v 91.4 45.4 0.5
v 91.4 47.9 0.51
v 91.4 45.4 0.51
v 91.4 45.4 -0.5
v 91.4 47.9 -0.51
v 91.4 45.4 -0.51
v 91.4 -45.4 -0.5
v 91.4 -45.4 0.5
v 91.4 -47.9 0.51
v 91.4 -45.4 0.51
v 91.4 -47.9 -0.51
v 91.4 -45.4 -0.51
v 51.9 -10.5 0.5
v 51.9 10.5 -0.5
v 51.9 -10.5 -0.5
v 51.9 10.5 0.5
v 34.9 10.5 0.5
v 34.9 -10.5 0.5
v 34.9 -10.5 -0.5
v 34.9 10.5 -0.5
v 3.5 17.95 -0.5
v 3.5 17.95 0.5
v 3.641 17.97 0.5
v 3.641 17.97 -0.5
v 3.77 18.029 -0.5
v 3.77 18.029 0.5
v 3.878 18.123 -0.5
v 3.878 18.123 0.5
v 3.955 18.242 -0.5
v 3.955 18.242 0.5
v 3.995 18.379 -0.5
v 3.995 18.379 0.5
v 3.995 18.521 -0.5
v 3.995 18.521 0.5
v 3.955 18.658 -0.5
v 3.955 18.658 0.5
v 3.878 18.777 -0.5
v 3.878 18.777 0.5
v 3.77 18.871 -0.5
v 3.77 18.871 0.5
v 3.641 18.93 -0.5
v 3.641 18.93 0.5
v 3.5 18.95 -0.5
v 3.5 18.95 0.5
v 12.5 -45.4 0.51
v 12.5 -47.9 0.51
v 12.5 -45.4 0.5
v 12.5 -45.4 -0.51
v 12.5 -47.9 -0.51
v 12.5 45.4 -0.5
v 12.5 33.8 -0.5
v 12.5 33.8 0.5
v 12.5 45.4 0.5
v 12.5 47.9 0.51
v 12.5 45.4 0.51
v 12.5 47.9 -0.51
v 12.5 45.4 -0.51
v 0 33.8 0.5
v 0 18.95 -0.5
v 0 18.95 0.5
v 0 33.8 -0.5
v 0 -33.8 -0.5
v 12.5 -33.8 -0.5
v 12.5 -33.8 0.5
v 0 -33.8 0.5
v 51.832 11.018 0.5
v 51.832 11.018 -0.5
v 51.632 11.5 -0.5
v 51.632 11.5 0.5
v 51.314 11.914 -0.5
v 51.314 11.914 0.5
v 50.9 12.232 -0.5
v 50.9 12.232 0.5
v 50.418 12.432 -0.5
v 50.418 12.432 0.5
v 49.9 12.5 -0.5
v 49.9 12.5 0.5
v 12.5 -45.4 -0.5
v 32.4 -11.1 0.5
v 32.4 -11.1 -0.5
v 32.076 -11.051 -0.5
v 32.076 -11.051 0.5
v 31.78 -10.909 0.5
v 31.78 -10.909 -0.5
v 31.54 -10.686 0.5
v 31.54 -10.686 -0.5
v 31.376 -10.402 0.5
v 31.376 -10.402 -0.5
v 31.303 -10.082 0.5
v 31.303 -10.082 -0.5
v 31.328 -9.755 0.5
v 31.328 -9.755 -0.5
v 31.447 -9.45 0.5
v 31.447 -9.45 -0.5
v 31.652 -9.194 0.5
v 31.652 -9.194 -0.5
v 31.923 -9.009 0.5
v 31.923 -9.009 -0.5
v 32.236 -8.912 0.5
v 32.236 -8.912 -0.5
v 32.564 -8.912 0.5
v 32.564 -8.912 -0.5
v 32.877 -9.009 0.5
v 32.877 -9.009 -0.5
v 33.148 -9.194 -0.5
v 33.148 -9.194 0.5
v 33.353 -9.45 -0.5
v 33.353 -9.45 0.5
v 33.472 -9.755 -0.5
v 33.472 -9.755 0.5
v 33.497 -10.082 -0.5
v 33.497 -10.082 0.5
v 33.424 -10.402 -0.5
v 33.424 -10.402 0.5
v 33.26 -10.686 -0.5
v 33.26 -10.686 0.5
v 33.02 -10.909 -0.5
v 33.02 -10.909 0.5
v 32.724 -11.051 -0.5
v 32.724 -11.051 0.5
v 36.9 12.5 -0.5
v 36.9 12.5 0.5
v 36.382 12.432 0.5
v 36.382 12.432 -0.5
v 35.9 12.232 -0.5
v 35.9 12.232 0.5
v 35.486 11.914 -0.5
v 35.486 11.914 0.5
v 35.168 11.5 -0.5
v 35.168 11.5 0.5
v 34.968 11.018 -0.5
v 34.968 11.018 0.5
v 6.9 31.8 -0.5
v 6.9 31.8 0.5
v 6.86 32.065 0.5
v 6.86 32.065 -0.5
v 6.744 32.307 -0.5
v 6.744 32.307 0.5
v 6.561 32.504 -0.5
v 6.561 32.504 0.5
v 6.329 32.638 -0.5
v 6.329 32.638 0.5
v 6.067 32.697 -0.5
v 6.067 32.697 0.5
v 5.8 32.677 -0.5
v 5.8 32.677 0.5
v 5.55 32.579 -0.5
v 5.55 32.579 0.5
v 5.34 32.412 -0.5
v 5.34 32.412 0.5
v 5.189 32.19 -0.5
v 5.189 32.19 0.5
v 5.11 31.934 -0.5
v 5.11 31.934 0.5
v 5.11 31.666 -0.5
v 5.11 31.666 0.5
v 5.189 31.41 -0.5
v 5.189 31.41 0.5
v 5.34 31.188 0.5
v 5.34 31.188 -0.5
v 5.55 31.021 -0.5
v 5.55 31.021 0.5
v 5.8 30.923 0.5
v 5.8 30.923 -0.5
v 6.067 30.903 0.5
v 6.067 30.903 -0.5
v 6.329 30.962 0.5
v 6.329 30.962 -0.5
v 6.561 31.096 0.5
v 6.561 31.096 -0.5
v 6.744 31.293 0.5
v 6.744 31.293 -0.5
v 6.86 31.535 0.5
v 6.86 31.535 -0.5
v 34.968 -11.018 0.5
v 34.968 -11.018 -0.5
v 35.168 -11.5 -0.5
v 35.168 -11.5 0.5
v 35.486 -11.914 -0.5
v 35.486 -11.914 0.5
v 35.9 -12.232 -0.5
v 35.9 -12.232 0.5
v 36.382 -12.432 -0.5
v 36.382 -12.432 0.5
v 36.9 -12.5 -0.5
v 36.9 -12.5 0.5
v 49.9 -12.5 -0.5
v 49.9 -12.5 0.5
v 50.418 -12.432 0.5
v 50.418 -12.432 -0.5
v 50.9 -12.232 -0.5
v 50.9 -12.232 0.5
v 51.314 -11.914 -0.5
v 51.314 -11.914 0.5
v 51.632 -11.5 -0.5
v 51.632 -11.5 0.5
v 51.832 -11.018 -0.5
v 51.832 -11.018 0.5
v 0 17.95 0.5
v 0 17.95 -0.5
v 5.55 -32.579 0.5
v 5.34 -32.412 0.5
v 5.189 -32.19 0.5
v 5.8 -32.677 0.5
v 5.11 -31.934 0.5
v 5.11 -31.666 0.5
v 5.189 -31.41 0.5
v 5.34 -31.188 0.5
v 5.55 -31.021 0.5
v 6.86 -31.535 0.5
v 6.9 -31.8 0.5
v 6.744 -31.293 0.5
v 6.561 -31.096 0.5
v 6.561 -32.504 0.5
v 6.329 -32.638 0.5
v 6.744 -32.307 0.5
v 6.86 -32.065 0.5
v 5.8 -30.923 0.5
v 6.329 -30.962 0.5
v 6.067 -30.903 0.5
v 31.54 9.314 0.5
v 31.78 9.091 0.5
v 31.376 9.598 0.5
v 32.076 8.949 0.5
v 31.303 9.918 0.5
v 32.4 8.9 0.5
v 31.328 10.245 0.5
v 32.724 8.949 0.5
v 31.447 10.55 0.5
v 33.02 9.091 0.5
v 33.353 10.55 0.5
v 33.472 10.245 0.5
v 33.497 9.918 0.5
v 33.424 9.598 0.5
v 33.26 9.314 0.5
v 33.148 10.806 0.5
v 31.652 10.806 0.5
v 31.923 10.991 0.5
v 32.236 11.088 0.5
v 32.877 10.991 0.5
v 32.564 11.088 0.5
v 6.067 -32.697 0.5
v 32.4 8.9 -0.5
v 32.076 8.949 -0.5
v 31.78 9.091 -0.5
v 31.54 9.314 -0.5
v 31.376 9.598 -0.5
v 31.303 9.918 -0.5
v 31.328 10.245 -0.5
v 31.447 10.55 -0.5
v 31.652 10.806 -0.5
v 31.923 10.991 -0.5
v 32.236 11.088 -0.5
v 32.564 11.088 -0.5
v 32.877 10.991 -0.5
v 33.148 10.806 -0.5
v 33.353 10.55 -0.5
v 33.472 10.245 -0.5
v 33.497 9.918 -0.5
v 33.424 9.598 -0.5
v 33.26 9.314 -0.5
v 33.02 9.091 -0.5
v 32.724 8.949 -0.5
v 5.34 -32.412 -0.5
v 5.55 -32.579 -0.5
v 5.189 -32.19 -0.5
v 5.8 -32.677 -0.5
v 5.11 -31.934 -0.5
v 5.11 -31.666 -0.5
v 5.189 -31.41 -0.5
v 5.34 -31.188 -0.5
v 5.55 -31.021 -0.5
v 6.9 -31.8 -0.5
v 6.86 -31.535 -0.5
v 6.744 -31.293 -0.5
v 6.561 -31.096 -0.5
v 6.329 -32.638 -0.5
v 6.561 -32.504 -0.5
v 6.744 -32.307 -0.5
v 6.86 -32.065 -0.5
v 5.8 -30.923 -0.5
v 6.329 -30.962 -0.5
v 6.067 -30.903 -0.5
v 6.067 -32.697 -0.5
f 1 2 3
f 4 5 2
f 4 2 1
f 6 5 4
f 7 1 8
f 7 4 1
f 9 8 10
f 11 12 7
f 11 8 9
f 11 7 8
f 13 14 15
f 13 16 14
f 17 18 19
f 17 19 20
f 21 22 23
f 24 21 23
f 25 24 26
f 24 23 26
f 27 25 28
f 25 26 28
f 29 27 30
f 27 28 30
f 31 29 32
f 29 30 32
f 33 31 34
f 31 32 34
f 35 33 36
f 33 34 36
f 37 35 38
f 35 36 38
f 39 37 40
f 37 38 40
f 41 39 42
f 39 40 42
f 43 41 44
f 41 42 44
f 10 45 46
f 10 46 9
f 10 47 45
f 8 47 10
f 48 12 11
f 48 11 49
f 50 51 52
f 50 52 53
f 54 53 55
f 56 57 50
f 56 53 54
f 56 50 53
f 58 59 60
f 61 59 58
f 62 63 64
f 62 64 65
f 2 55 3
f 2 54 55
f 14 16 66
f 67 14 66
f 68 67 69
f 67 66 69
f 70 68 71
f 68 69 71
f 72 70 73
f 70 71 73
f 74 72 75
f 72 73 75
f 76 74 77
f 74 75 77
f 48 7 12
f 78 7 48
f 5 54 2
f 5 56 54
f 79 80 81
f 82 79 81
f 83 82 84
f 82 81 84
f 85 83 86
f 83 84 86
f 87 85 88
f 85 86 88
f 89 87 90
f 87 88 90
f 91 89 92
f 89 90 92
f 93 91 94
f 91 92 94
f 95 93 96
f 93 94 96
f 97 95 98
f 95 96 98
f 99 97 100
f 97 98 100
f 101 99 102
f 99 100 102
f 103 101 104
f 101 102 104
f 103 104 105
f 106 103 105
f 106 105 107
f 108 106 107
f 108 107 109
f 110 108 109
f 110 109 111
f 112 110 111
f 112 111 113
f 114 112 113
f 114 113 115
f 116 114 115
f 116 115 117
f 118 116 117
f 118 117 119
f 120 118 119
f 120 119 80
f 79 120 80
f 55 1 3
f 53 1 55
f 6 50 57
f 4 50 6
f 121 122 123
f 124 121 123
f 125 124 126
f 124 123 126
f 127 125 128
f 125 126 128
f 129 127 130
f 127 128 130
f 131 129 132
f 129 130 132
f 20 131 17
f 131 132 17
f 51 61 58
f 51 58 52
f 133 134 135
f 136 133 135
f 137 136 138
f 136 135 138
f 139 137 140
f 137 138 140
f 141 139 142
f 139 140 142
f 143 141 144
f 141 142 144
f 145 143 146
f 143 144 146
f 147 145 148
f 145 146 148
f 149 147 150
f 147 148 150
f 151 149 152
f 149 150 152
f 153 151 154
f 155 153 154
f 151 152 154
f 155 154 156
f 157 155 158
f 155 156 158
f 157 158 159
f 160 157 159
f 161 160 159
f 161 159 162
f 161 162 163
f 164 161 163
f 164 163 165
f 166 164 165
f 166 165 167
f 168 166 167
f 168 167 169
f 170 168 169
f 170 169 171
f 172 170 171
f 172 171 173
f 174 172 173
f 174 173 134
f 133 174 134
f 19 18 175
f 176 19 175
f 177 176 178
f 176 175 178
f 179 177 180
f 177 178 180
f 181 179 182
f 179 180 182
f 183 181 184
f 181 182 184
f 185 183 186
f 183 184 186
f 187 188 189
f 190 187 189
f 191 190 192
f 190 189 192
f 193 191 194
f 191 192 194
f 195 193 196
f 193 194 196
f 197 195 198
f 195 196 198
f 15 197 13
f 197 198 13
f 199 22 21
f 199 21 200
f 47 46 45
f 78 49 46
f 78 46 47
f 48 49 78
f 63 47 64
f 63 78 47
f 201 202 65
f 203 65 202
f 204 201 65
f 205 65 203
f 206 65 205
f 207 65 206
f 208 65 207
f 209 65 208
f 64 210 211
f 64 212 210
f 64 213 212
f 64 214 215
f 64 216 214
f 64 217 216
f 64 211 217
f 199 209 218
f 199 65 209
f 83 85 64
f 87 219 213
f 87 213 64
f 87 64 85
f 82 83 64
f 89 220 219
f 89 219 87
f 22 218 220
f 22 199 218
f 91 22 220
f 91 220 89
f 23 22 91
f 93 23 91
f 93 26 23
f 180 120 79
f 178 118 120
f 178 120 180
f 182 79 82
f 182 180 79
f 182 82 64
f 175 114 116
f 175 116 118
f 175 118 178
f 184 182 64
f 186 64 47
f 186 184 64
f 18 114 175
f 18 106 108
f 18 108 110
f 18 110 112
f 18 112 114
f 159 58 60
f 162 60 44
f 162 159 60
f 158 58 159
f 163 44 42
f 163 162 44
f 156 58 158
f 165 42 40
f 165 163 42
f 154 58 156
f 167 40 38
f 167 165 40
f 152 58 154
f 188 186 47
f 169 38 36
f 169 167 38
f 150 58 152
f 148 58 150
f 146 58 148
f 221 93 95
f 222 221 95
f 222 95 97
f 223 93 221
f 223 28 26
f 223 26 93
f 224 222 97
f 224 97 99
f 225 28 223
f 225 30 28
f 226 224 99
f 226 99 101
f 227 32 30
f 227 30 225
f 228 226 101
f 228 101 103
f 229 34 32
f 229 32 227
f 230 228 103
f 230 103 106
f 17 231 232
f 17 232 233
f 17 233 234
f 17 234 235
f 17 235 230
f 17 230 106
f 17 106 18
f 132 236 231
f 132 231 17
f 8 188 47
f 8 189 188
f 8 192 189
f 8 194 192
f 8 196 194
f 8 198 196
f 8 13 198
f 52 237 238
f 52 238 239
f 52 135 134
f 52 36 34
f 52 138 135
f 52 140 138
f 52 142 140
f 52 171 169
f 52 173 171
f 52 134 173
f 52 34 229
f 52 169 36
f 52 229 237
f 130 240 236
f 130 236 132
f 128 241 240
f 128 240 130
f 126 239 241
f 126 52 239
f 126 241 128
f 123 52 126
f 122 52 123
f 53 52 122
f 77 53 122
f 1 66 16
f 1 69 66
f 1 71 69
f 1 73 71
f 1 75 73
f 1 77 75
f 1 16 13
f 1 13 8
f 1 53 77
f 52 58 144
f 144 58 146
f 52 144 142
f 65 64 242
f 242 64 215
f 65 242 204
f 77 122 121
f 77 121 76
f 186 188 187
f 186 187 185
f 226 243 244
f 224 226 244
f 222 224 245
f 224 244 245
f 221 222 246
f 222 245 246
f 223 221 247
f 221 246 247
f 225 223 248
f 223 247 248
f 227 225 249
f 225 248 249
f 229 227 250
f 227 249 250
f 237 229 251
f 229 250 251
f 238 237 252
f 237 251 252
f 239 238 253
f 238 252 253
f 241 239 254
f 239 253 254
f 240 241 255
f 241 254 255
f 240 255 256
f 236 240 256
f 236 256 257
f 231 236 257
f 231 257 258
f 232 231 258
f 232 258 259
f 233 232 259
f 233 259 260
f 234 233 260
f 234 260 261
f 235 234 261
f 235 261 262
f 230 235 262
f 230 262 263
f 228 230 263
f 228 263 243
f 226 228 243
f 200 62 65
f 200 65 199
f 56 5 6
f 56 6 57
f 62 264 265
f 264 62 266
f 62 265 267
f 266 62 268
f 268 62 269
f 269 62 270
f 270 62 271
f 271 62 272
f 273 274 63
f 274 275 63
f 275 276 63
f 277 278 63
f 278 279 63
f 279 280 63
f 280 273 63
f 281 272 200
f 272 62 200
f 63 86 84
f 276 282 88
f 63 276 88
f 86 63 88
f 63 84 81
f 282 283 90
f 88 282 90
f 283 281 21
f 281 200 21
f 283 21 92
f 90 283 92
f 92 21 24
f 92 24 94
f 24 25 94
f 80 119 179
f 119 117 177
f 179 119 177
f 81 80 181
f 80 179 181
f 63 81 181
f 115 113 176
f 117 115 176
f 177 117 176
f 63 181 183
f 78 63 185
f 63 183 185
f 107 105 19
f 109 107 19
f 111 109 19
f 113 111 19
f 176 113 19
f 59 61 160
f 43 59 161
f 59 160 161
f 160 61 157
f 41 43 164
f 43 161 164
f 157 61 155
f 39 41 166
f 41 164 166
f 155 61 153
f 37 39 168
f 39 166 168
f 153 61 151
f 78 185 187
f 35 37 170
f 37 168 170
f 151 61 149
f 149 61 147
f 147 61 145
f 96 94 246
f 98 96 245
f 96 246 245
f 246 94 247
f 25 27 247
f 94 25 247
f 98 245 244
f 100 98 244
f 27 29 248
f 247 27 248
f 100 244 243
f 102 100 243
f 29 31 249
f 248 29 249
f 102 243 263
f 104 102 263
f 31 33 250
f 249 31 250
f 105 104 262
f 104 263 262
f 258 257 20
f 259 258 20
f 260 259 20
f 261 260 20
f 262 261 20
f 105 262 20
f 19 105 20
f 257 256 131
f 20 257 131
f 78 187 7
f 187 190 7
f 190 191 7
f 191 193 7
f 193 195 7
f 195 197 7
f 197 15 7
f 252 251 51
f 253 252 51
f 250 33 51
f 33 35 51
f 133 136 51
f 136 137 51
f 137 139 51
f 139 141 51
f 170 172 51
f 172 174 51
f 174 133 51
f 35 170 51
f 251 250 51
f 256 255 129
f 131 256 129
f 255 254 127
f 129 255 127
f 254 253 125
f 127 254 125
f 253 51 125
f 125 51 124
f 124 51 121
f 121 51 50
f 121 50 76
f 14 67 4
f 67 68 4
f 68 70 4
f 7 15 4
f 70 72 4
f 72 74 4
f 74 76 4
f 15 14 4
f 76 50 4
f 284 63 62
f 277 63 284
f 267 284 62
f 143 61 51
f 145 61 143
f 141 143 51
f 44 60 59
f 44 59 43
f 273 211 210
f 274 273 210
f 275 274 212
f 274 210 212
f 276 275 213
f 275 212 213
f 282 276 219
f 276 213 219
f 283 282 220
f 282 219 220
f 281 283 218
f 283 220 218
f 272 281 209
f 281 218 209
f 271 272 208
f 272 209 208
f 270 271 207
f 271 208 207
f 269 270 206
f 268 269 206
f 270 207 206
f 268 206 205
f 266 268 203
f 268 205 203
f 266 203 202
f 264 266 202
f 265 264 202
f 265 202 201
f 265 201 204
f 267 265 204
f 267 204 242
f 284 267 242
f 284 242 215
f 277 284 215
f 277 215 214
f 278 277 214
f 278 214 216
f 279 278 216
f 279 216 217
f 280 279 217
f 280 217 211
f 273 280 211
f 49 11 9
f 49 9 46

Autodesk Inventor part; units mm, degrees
ref_plane "YZ Plane" through (0, 0, 0) normal (1, 0, 0) x (0, 1, 0)
ref_plane "XZ Plane" through (0, 0, 0) normal (0, 1, 0) x (-1, 0, 0)
ref_plane "XY Plane" through (0, 0, 0) normal (0, 0, 1) x (1, 0, 0)
sketch "Sketch1" plane through (0, 0, 0) normal (0, 0, 1) x (1, 0, 0)
  line L0 (0, 33.8) -> (12.5, 33.8)
  line L1 (12.5, 33.8) -> (12.5, 47.9)
  line L2 (12.5, 47.9) -> (91.4, 47.9)
  line L3 (91.4, 47.9) -> (91.4, -47.9)
  line L4 (91.4, -47.9) -> (12.5, -47.9)
  line L5 (12.5, -47.9) -> (12.5, -33.8)
  line L6 (12.5, -33.8) -> (0, -33.8)
  line L7 (0, -33.8) -> (0, 33.8)
  line L8 (-4.5, 48) -> (91.5, 48) construction
  line L9 (91.5, 48) -> (91.5, -48) construction
  line L10 (91.5, -48) -> (-4.5, -48) construction
  line L11 (-4.5, -48) -> (-4.5, 48) construction
  line L12 (-4.4, 47.9) -> (-3.4, 47.9) construction
  line L13 (-3.4, 47.9) -> (-3.4, -47.9) construction
  line L14 (-3.4, -47.9) -> (-4.4, -47.9) construction
  line L15 (-4.4, -47.9) -> (-4.4, 47.9) construction
  point P0 (0, 0)
  point P1 (0, 0)
  point P2 (-4.5, 0)
  dimension "d0" = 67.6
  dimension "d1" = 95.8
  dimension "d2" = 91.4
  dimension "d3" = 12.5
  dimension "d20" = 96
  dimension "d21" = 96
  dimension "d22" = 0.1
  dimension "d23" = 0.1
  dimension "d24" = 1
  dimension "d25" = 0.1
  dimension "d26" = 3.4
extrude "Extrusion1" add sketch "Sketch1" along normal mid plane 1
sketch "Sketch2" plane through (0, 0, 0.5) normal (0, 0, 1) x (1, 0, 0)
  line L0 (12.5, 33.8) -> (0, 33.8) projected
  line L1 (0, 33.8) -> (0, -33.8) projected
  line L2 (0, -33.8) -> (12.5, -33.8) projected
  line L3 (12.5, -33.8) -> (12.5, -47.9) projected
  line L4 (12.5, -47.9) -> (91.4, -47.9) projected
  line L5 (91.4, -47.9) -> (91.4, 47.9) projected
  line L6 (91.4, 47.9) -> (12.5, 47.9) projected
  line L7 (12.5, 47.9) -> (12.5, 33.8) projected
  line L8 (91.4, -47.9) -> (91.4, 47.9) projected
  line L9 (12.5, 47.9) -> (91.4, 47.9)
  line L10 (91.4, 47.9) -> (91.4, 45.4)
  line L11 (91.4, 45.4) -> (12.5, 45.4)
  line L12 (12.5, 45.4) -> (12.5, 47.9)
  line L13 (91.4, -47.9) -> (12.5, -47.9)
  line L14 (12.5, -47.9) -> (12.5, -45.4)
  line L15 (12.5, -45.4) -> (91.4, -45.4)
  line L16 (91.4, -45.4) -> (91.4, -47.9)
  point P0 (0, 0)
  dimension "d6" = 2.5
  dimension "d27" = 90.8
extrude "Extrusion2" add sketch "Sketch2" along normal blind 0.01 contours L7 L6 L5 L11 | L5 L4 L3 L15
mirror "Mirror1" about plane through (0, 0, 0) normal (0, 0, 1) of "Extrusion2"
sketch "Sketch3" plane through (0, 0, 0.5) normal (0, 0, 1) x (1, 0, 0)
  circle A0 centre (6, 31.8) radius 0.9
  circle A1 centre (6, -31.8) radius 0.9
  point P0 (0, 0)
  dimension "d9" = 1.8
  dimension "d10" = 6
  dimension "d11" = 31.8
  dimension "d12" = 31.8
extrude "Extrusion3" cut sketch "Sketch3" against normal through all
sketch "Sketch4" plane through (0, 0, 0.5) normal (0, 0, 1) x (1, 0, 0)
  circle A0 centre (6, 31.8) radius 0.9 projected
  circle A1 centre (6, -31.8) radius 0.9 projected
  line L0 (12.5, -45.4) -> (91.4, -45.4) projected
  line L1 (91.4, -45.4) -> (91.4, 45.4) projected
  line L2 (91.4, 45.4) -> (12.5, 45.4) projected
  line L3 (12.5, 45.4) -> (12.5, 33.8) projected
  line L4 (12.5, 33.8) -> (0, 33.8) projected
  line L5 (0, 33.8) -> (0, -33.8) projected
  line L6 (0, -33.8) -> (12.5, -33.8) projected
  line L7 (12.5, -33.8) -> (12.5, -45.4) projected
  line L8 (0, 18.95) -> (3.5, 18.95)
  arc A2 (3.5, 17.95) -> (3.5, 18.95) centre (3.5, 18.45) ccw
  line L9 (3.5, 17.95) -> (0, 17.95)
  point P0 (0, 0)
  dimension "d15" = 17.95
  dimension "d16" = 3.5
  dimension "d17" = 1
extrude "Extrusion4" cut sketch "Sketch4" against normal through all contours L5 L8 A2 L9
sketch "Sketch5" plane through (0, 0, 0.5) normal (0, 0, 1) x (1, 0, 0)
  line L0 (0, 18.95) -> (3.5, 18.95) projected
  arc A0 (3.5, 17.95) -> (3.5, 18.95) centre (3.5, 18.45) ccw projected
  line L1 (3.5, 17.95) -> (0, 17.95) projected
  line L2 (0, 17.95) -> (0, -33.8) projected
  line L3 (0, -33.8) -> (12.5, -33.8) projected
  line L4 (12.5, -33.8) -> (12.5, -45.4) projected
  line L5 (12.5, -45.4) -> (91.4, -45.4) projected
  line L6 (91.4, -45.4) -> (91.4, 45.4) projected
  line L7 (91.4, 45.4) -> (12.5, 45.4) projected
  line L8 (12.5, 45.4) -> (12.5, 33.8) projected
  line L9 (12.5, 33.8) -> (0, 33.8) projected
  line L10 (0, 33.8) -> (0, 18.95) projected
  circle A1 centre (6, -31.8) radius 0.9 projected
  circle A2 centre (6, 31.8) radius 0.9 projected
  circle A3 centre (43.4, 0) radius 6 construction
  line L11 (36.9, 12.5) -> (49.9, 12.5)
  line L12 (51.9, 10.5) -> (51.9, -10.5)
  line L13 (49.9, -12.5) -> (36.9, -12.5)
  line L14 (34.9, -10.5) -> (34.9, 10.5)
  arc A4 (36.9, 12.5) -> (34.9, 10.5) centre (36.9, 10.5) ccw
  arc A5 (51.9, 10.5) -> (49.9, 12.5) centre (49.9, 10.5) ccw
  arc A6 (49.9, -12.5) -> (51.9, -10.5) centre (49.9, -10.5) ccw
  arc A7 (34.9, -10.5) -> (36.9, -12.5) centre (36.9, -10.5) ccw
  point P0 (0, 0)
  point P1 (51.9, -12.5)
  point P2 (51.9, 12.5)
  point P3 (34.9, -12.5)
  point P4 (43.4, 12.5)
  point P5 (34.9, 0)
  dimension "d28" = 43.4
  dimension "d29" = 12
  dimension "d41" = 17
  dimension "d42" = 25
  dimension "d43" = 2
extrude "Extrusion5" cut sketch "Sketch5" against normal through all contours L11 A5 L12 A6 L13 A7 L14 A4
sketch "Sketch6" plane through (0, 0, 0.5) normal (0, 0, 1) x (1, 0, 0)
  line L0 (32.4, 10) -> (32.4, -10) construction
  circle A0 centre (43.4, 0) radius 6 construction
  point P0 (0, 0)
  point P1 (32.4, 0)
  dimension "d32" = 20
  dimension "d44" = 11
hole "Hole1" at (32.4, 10, 0.5) at (32.4, -10, 0.5) direction (0, 0, -1) diameter 2.2 end through all clearance for "Flat Head Machine Screw" size "M2" standard "Ansi Metric M Profile"
equation "\"d23\" = d22"
equation "\"d25\" = d22"
equation "\"d12\" = d11"
properties part number "Payload_PCB" material "Epoxy Resin"
